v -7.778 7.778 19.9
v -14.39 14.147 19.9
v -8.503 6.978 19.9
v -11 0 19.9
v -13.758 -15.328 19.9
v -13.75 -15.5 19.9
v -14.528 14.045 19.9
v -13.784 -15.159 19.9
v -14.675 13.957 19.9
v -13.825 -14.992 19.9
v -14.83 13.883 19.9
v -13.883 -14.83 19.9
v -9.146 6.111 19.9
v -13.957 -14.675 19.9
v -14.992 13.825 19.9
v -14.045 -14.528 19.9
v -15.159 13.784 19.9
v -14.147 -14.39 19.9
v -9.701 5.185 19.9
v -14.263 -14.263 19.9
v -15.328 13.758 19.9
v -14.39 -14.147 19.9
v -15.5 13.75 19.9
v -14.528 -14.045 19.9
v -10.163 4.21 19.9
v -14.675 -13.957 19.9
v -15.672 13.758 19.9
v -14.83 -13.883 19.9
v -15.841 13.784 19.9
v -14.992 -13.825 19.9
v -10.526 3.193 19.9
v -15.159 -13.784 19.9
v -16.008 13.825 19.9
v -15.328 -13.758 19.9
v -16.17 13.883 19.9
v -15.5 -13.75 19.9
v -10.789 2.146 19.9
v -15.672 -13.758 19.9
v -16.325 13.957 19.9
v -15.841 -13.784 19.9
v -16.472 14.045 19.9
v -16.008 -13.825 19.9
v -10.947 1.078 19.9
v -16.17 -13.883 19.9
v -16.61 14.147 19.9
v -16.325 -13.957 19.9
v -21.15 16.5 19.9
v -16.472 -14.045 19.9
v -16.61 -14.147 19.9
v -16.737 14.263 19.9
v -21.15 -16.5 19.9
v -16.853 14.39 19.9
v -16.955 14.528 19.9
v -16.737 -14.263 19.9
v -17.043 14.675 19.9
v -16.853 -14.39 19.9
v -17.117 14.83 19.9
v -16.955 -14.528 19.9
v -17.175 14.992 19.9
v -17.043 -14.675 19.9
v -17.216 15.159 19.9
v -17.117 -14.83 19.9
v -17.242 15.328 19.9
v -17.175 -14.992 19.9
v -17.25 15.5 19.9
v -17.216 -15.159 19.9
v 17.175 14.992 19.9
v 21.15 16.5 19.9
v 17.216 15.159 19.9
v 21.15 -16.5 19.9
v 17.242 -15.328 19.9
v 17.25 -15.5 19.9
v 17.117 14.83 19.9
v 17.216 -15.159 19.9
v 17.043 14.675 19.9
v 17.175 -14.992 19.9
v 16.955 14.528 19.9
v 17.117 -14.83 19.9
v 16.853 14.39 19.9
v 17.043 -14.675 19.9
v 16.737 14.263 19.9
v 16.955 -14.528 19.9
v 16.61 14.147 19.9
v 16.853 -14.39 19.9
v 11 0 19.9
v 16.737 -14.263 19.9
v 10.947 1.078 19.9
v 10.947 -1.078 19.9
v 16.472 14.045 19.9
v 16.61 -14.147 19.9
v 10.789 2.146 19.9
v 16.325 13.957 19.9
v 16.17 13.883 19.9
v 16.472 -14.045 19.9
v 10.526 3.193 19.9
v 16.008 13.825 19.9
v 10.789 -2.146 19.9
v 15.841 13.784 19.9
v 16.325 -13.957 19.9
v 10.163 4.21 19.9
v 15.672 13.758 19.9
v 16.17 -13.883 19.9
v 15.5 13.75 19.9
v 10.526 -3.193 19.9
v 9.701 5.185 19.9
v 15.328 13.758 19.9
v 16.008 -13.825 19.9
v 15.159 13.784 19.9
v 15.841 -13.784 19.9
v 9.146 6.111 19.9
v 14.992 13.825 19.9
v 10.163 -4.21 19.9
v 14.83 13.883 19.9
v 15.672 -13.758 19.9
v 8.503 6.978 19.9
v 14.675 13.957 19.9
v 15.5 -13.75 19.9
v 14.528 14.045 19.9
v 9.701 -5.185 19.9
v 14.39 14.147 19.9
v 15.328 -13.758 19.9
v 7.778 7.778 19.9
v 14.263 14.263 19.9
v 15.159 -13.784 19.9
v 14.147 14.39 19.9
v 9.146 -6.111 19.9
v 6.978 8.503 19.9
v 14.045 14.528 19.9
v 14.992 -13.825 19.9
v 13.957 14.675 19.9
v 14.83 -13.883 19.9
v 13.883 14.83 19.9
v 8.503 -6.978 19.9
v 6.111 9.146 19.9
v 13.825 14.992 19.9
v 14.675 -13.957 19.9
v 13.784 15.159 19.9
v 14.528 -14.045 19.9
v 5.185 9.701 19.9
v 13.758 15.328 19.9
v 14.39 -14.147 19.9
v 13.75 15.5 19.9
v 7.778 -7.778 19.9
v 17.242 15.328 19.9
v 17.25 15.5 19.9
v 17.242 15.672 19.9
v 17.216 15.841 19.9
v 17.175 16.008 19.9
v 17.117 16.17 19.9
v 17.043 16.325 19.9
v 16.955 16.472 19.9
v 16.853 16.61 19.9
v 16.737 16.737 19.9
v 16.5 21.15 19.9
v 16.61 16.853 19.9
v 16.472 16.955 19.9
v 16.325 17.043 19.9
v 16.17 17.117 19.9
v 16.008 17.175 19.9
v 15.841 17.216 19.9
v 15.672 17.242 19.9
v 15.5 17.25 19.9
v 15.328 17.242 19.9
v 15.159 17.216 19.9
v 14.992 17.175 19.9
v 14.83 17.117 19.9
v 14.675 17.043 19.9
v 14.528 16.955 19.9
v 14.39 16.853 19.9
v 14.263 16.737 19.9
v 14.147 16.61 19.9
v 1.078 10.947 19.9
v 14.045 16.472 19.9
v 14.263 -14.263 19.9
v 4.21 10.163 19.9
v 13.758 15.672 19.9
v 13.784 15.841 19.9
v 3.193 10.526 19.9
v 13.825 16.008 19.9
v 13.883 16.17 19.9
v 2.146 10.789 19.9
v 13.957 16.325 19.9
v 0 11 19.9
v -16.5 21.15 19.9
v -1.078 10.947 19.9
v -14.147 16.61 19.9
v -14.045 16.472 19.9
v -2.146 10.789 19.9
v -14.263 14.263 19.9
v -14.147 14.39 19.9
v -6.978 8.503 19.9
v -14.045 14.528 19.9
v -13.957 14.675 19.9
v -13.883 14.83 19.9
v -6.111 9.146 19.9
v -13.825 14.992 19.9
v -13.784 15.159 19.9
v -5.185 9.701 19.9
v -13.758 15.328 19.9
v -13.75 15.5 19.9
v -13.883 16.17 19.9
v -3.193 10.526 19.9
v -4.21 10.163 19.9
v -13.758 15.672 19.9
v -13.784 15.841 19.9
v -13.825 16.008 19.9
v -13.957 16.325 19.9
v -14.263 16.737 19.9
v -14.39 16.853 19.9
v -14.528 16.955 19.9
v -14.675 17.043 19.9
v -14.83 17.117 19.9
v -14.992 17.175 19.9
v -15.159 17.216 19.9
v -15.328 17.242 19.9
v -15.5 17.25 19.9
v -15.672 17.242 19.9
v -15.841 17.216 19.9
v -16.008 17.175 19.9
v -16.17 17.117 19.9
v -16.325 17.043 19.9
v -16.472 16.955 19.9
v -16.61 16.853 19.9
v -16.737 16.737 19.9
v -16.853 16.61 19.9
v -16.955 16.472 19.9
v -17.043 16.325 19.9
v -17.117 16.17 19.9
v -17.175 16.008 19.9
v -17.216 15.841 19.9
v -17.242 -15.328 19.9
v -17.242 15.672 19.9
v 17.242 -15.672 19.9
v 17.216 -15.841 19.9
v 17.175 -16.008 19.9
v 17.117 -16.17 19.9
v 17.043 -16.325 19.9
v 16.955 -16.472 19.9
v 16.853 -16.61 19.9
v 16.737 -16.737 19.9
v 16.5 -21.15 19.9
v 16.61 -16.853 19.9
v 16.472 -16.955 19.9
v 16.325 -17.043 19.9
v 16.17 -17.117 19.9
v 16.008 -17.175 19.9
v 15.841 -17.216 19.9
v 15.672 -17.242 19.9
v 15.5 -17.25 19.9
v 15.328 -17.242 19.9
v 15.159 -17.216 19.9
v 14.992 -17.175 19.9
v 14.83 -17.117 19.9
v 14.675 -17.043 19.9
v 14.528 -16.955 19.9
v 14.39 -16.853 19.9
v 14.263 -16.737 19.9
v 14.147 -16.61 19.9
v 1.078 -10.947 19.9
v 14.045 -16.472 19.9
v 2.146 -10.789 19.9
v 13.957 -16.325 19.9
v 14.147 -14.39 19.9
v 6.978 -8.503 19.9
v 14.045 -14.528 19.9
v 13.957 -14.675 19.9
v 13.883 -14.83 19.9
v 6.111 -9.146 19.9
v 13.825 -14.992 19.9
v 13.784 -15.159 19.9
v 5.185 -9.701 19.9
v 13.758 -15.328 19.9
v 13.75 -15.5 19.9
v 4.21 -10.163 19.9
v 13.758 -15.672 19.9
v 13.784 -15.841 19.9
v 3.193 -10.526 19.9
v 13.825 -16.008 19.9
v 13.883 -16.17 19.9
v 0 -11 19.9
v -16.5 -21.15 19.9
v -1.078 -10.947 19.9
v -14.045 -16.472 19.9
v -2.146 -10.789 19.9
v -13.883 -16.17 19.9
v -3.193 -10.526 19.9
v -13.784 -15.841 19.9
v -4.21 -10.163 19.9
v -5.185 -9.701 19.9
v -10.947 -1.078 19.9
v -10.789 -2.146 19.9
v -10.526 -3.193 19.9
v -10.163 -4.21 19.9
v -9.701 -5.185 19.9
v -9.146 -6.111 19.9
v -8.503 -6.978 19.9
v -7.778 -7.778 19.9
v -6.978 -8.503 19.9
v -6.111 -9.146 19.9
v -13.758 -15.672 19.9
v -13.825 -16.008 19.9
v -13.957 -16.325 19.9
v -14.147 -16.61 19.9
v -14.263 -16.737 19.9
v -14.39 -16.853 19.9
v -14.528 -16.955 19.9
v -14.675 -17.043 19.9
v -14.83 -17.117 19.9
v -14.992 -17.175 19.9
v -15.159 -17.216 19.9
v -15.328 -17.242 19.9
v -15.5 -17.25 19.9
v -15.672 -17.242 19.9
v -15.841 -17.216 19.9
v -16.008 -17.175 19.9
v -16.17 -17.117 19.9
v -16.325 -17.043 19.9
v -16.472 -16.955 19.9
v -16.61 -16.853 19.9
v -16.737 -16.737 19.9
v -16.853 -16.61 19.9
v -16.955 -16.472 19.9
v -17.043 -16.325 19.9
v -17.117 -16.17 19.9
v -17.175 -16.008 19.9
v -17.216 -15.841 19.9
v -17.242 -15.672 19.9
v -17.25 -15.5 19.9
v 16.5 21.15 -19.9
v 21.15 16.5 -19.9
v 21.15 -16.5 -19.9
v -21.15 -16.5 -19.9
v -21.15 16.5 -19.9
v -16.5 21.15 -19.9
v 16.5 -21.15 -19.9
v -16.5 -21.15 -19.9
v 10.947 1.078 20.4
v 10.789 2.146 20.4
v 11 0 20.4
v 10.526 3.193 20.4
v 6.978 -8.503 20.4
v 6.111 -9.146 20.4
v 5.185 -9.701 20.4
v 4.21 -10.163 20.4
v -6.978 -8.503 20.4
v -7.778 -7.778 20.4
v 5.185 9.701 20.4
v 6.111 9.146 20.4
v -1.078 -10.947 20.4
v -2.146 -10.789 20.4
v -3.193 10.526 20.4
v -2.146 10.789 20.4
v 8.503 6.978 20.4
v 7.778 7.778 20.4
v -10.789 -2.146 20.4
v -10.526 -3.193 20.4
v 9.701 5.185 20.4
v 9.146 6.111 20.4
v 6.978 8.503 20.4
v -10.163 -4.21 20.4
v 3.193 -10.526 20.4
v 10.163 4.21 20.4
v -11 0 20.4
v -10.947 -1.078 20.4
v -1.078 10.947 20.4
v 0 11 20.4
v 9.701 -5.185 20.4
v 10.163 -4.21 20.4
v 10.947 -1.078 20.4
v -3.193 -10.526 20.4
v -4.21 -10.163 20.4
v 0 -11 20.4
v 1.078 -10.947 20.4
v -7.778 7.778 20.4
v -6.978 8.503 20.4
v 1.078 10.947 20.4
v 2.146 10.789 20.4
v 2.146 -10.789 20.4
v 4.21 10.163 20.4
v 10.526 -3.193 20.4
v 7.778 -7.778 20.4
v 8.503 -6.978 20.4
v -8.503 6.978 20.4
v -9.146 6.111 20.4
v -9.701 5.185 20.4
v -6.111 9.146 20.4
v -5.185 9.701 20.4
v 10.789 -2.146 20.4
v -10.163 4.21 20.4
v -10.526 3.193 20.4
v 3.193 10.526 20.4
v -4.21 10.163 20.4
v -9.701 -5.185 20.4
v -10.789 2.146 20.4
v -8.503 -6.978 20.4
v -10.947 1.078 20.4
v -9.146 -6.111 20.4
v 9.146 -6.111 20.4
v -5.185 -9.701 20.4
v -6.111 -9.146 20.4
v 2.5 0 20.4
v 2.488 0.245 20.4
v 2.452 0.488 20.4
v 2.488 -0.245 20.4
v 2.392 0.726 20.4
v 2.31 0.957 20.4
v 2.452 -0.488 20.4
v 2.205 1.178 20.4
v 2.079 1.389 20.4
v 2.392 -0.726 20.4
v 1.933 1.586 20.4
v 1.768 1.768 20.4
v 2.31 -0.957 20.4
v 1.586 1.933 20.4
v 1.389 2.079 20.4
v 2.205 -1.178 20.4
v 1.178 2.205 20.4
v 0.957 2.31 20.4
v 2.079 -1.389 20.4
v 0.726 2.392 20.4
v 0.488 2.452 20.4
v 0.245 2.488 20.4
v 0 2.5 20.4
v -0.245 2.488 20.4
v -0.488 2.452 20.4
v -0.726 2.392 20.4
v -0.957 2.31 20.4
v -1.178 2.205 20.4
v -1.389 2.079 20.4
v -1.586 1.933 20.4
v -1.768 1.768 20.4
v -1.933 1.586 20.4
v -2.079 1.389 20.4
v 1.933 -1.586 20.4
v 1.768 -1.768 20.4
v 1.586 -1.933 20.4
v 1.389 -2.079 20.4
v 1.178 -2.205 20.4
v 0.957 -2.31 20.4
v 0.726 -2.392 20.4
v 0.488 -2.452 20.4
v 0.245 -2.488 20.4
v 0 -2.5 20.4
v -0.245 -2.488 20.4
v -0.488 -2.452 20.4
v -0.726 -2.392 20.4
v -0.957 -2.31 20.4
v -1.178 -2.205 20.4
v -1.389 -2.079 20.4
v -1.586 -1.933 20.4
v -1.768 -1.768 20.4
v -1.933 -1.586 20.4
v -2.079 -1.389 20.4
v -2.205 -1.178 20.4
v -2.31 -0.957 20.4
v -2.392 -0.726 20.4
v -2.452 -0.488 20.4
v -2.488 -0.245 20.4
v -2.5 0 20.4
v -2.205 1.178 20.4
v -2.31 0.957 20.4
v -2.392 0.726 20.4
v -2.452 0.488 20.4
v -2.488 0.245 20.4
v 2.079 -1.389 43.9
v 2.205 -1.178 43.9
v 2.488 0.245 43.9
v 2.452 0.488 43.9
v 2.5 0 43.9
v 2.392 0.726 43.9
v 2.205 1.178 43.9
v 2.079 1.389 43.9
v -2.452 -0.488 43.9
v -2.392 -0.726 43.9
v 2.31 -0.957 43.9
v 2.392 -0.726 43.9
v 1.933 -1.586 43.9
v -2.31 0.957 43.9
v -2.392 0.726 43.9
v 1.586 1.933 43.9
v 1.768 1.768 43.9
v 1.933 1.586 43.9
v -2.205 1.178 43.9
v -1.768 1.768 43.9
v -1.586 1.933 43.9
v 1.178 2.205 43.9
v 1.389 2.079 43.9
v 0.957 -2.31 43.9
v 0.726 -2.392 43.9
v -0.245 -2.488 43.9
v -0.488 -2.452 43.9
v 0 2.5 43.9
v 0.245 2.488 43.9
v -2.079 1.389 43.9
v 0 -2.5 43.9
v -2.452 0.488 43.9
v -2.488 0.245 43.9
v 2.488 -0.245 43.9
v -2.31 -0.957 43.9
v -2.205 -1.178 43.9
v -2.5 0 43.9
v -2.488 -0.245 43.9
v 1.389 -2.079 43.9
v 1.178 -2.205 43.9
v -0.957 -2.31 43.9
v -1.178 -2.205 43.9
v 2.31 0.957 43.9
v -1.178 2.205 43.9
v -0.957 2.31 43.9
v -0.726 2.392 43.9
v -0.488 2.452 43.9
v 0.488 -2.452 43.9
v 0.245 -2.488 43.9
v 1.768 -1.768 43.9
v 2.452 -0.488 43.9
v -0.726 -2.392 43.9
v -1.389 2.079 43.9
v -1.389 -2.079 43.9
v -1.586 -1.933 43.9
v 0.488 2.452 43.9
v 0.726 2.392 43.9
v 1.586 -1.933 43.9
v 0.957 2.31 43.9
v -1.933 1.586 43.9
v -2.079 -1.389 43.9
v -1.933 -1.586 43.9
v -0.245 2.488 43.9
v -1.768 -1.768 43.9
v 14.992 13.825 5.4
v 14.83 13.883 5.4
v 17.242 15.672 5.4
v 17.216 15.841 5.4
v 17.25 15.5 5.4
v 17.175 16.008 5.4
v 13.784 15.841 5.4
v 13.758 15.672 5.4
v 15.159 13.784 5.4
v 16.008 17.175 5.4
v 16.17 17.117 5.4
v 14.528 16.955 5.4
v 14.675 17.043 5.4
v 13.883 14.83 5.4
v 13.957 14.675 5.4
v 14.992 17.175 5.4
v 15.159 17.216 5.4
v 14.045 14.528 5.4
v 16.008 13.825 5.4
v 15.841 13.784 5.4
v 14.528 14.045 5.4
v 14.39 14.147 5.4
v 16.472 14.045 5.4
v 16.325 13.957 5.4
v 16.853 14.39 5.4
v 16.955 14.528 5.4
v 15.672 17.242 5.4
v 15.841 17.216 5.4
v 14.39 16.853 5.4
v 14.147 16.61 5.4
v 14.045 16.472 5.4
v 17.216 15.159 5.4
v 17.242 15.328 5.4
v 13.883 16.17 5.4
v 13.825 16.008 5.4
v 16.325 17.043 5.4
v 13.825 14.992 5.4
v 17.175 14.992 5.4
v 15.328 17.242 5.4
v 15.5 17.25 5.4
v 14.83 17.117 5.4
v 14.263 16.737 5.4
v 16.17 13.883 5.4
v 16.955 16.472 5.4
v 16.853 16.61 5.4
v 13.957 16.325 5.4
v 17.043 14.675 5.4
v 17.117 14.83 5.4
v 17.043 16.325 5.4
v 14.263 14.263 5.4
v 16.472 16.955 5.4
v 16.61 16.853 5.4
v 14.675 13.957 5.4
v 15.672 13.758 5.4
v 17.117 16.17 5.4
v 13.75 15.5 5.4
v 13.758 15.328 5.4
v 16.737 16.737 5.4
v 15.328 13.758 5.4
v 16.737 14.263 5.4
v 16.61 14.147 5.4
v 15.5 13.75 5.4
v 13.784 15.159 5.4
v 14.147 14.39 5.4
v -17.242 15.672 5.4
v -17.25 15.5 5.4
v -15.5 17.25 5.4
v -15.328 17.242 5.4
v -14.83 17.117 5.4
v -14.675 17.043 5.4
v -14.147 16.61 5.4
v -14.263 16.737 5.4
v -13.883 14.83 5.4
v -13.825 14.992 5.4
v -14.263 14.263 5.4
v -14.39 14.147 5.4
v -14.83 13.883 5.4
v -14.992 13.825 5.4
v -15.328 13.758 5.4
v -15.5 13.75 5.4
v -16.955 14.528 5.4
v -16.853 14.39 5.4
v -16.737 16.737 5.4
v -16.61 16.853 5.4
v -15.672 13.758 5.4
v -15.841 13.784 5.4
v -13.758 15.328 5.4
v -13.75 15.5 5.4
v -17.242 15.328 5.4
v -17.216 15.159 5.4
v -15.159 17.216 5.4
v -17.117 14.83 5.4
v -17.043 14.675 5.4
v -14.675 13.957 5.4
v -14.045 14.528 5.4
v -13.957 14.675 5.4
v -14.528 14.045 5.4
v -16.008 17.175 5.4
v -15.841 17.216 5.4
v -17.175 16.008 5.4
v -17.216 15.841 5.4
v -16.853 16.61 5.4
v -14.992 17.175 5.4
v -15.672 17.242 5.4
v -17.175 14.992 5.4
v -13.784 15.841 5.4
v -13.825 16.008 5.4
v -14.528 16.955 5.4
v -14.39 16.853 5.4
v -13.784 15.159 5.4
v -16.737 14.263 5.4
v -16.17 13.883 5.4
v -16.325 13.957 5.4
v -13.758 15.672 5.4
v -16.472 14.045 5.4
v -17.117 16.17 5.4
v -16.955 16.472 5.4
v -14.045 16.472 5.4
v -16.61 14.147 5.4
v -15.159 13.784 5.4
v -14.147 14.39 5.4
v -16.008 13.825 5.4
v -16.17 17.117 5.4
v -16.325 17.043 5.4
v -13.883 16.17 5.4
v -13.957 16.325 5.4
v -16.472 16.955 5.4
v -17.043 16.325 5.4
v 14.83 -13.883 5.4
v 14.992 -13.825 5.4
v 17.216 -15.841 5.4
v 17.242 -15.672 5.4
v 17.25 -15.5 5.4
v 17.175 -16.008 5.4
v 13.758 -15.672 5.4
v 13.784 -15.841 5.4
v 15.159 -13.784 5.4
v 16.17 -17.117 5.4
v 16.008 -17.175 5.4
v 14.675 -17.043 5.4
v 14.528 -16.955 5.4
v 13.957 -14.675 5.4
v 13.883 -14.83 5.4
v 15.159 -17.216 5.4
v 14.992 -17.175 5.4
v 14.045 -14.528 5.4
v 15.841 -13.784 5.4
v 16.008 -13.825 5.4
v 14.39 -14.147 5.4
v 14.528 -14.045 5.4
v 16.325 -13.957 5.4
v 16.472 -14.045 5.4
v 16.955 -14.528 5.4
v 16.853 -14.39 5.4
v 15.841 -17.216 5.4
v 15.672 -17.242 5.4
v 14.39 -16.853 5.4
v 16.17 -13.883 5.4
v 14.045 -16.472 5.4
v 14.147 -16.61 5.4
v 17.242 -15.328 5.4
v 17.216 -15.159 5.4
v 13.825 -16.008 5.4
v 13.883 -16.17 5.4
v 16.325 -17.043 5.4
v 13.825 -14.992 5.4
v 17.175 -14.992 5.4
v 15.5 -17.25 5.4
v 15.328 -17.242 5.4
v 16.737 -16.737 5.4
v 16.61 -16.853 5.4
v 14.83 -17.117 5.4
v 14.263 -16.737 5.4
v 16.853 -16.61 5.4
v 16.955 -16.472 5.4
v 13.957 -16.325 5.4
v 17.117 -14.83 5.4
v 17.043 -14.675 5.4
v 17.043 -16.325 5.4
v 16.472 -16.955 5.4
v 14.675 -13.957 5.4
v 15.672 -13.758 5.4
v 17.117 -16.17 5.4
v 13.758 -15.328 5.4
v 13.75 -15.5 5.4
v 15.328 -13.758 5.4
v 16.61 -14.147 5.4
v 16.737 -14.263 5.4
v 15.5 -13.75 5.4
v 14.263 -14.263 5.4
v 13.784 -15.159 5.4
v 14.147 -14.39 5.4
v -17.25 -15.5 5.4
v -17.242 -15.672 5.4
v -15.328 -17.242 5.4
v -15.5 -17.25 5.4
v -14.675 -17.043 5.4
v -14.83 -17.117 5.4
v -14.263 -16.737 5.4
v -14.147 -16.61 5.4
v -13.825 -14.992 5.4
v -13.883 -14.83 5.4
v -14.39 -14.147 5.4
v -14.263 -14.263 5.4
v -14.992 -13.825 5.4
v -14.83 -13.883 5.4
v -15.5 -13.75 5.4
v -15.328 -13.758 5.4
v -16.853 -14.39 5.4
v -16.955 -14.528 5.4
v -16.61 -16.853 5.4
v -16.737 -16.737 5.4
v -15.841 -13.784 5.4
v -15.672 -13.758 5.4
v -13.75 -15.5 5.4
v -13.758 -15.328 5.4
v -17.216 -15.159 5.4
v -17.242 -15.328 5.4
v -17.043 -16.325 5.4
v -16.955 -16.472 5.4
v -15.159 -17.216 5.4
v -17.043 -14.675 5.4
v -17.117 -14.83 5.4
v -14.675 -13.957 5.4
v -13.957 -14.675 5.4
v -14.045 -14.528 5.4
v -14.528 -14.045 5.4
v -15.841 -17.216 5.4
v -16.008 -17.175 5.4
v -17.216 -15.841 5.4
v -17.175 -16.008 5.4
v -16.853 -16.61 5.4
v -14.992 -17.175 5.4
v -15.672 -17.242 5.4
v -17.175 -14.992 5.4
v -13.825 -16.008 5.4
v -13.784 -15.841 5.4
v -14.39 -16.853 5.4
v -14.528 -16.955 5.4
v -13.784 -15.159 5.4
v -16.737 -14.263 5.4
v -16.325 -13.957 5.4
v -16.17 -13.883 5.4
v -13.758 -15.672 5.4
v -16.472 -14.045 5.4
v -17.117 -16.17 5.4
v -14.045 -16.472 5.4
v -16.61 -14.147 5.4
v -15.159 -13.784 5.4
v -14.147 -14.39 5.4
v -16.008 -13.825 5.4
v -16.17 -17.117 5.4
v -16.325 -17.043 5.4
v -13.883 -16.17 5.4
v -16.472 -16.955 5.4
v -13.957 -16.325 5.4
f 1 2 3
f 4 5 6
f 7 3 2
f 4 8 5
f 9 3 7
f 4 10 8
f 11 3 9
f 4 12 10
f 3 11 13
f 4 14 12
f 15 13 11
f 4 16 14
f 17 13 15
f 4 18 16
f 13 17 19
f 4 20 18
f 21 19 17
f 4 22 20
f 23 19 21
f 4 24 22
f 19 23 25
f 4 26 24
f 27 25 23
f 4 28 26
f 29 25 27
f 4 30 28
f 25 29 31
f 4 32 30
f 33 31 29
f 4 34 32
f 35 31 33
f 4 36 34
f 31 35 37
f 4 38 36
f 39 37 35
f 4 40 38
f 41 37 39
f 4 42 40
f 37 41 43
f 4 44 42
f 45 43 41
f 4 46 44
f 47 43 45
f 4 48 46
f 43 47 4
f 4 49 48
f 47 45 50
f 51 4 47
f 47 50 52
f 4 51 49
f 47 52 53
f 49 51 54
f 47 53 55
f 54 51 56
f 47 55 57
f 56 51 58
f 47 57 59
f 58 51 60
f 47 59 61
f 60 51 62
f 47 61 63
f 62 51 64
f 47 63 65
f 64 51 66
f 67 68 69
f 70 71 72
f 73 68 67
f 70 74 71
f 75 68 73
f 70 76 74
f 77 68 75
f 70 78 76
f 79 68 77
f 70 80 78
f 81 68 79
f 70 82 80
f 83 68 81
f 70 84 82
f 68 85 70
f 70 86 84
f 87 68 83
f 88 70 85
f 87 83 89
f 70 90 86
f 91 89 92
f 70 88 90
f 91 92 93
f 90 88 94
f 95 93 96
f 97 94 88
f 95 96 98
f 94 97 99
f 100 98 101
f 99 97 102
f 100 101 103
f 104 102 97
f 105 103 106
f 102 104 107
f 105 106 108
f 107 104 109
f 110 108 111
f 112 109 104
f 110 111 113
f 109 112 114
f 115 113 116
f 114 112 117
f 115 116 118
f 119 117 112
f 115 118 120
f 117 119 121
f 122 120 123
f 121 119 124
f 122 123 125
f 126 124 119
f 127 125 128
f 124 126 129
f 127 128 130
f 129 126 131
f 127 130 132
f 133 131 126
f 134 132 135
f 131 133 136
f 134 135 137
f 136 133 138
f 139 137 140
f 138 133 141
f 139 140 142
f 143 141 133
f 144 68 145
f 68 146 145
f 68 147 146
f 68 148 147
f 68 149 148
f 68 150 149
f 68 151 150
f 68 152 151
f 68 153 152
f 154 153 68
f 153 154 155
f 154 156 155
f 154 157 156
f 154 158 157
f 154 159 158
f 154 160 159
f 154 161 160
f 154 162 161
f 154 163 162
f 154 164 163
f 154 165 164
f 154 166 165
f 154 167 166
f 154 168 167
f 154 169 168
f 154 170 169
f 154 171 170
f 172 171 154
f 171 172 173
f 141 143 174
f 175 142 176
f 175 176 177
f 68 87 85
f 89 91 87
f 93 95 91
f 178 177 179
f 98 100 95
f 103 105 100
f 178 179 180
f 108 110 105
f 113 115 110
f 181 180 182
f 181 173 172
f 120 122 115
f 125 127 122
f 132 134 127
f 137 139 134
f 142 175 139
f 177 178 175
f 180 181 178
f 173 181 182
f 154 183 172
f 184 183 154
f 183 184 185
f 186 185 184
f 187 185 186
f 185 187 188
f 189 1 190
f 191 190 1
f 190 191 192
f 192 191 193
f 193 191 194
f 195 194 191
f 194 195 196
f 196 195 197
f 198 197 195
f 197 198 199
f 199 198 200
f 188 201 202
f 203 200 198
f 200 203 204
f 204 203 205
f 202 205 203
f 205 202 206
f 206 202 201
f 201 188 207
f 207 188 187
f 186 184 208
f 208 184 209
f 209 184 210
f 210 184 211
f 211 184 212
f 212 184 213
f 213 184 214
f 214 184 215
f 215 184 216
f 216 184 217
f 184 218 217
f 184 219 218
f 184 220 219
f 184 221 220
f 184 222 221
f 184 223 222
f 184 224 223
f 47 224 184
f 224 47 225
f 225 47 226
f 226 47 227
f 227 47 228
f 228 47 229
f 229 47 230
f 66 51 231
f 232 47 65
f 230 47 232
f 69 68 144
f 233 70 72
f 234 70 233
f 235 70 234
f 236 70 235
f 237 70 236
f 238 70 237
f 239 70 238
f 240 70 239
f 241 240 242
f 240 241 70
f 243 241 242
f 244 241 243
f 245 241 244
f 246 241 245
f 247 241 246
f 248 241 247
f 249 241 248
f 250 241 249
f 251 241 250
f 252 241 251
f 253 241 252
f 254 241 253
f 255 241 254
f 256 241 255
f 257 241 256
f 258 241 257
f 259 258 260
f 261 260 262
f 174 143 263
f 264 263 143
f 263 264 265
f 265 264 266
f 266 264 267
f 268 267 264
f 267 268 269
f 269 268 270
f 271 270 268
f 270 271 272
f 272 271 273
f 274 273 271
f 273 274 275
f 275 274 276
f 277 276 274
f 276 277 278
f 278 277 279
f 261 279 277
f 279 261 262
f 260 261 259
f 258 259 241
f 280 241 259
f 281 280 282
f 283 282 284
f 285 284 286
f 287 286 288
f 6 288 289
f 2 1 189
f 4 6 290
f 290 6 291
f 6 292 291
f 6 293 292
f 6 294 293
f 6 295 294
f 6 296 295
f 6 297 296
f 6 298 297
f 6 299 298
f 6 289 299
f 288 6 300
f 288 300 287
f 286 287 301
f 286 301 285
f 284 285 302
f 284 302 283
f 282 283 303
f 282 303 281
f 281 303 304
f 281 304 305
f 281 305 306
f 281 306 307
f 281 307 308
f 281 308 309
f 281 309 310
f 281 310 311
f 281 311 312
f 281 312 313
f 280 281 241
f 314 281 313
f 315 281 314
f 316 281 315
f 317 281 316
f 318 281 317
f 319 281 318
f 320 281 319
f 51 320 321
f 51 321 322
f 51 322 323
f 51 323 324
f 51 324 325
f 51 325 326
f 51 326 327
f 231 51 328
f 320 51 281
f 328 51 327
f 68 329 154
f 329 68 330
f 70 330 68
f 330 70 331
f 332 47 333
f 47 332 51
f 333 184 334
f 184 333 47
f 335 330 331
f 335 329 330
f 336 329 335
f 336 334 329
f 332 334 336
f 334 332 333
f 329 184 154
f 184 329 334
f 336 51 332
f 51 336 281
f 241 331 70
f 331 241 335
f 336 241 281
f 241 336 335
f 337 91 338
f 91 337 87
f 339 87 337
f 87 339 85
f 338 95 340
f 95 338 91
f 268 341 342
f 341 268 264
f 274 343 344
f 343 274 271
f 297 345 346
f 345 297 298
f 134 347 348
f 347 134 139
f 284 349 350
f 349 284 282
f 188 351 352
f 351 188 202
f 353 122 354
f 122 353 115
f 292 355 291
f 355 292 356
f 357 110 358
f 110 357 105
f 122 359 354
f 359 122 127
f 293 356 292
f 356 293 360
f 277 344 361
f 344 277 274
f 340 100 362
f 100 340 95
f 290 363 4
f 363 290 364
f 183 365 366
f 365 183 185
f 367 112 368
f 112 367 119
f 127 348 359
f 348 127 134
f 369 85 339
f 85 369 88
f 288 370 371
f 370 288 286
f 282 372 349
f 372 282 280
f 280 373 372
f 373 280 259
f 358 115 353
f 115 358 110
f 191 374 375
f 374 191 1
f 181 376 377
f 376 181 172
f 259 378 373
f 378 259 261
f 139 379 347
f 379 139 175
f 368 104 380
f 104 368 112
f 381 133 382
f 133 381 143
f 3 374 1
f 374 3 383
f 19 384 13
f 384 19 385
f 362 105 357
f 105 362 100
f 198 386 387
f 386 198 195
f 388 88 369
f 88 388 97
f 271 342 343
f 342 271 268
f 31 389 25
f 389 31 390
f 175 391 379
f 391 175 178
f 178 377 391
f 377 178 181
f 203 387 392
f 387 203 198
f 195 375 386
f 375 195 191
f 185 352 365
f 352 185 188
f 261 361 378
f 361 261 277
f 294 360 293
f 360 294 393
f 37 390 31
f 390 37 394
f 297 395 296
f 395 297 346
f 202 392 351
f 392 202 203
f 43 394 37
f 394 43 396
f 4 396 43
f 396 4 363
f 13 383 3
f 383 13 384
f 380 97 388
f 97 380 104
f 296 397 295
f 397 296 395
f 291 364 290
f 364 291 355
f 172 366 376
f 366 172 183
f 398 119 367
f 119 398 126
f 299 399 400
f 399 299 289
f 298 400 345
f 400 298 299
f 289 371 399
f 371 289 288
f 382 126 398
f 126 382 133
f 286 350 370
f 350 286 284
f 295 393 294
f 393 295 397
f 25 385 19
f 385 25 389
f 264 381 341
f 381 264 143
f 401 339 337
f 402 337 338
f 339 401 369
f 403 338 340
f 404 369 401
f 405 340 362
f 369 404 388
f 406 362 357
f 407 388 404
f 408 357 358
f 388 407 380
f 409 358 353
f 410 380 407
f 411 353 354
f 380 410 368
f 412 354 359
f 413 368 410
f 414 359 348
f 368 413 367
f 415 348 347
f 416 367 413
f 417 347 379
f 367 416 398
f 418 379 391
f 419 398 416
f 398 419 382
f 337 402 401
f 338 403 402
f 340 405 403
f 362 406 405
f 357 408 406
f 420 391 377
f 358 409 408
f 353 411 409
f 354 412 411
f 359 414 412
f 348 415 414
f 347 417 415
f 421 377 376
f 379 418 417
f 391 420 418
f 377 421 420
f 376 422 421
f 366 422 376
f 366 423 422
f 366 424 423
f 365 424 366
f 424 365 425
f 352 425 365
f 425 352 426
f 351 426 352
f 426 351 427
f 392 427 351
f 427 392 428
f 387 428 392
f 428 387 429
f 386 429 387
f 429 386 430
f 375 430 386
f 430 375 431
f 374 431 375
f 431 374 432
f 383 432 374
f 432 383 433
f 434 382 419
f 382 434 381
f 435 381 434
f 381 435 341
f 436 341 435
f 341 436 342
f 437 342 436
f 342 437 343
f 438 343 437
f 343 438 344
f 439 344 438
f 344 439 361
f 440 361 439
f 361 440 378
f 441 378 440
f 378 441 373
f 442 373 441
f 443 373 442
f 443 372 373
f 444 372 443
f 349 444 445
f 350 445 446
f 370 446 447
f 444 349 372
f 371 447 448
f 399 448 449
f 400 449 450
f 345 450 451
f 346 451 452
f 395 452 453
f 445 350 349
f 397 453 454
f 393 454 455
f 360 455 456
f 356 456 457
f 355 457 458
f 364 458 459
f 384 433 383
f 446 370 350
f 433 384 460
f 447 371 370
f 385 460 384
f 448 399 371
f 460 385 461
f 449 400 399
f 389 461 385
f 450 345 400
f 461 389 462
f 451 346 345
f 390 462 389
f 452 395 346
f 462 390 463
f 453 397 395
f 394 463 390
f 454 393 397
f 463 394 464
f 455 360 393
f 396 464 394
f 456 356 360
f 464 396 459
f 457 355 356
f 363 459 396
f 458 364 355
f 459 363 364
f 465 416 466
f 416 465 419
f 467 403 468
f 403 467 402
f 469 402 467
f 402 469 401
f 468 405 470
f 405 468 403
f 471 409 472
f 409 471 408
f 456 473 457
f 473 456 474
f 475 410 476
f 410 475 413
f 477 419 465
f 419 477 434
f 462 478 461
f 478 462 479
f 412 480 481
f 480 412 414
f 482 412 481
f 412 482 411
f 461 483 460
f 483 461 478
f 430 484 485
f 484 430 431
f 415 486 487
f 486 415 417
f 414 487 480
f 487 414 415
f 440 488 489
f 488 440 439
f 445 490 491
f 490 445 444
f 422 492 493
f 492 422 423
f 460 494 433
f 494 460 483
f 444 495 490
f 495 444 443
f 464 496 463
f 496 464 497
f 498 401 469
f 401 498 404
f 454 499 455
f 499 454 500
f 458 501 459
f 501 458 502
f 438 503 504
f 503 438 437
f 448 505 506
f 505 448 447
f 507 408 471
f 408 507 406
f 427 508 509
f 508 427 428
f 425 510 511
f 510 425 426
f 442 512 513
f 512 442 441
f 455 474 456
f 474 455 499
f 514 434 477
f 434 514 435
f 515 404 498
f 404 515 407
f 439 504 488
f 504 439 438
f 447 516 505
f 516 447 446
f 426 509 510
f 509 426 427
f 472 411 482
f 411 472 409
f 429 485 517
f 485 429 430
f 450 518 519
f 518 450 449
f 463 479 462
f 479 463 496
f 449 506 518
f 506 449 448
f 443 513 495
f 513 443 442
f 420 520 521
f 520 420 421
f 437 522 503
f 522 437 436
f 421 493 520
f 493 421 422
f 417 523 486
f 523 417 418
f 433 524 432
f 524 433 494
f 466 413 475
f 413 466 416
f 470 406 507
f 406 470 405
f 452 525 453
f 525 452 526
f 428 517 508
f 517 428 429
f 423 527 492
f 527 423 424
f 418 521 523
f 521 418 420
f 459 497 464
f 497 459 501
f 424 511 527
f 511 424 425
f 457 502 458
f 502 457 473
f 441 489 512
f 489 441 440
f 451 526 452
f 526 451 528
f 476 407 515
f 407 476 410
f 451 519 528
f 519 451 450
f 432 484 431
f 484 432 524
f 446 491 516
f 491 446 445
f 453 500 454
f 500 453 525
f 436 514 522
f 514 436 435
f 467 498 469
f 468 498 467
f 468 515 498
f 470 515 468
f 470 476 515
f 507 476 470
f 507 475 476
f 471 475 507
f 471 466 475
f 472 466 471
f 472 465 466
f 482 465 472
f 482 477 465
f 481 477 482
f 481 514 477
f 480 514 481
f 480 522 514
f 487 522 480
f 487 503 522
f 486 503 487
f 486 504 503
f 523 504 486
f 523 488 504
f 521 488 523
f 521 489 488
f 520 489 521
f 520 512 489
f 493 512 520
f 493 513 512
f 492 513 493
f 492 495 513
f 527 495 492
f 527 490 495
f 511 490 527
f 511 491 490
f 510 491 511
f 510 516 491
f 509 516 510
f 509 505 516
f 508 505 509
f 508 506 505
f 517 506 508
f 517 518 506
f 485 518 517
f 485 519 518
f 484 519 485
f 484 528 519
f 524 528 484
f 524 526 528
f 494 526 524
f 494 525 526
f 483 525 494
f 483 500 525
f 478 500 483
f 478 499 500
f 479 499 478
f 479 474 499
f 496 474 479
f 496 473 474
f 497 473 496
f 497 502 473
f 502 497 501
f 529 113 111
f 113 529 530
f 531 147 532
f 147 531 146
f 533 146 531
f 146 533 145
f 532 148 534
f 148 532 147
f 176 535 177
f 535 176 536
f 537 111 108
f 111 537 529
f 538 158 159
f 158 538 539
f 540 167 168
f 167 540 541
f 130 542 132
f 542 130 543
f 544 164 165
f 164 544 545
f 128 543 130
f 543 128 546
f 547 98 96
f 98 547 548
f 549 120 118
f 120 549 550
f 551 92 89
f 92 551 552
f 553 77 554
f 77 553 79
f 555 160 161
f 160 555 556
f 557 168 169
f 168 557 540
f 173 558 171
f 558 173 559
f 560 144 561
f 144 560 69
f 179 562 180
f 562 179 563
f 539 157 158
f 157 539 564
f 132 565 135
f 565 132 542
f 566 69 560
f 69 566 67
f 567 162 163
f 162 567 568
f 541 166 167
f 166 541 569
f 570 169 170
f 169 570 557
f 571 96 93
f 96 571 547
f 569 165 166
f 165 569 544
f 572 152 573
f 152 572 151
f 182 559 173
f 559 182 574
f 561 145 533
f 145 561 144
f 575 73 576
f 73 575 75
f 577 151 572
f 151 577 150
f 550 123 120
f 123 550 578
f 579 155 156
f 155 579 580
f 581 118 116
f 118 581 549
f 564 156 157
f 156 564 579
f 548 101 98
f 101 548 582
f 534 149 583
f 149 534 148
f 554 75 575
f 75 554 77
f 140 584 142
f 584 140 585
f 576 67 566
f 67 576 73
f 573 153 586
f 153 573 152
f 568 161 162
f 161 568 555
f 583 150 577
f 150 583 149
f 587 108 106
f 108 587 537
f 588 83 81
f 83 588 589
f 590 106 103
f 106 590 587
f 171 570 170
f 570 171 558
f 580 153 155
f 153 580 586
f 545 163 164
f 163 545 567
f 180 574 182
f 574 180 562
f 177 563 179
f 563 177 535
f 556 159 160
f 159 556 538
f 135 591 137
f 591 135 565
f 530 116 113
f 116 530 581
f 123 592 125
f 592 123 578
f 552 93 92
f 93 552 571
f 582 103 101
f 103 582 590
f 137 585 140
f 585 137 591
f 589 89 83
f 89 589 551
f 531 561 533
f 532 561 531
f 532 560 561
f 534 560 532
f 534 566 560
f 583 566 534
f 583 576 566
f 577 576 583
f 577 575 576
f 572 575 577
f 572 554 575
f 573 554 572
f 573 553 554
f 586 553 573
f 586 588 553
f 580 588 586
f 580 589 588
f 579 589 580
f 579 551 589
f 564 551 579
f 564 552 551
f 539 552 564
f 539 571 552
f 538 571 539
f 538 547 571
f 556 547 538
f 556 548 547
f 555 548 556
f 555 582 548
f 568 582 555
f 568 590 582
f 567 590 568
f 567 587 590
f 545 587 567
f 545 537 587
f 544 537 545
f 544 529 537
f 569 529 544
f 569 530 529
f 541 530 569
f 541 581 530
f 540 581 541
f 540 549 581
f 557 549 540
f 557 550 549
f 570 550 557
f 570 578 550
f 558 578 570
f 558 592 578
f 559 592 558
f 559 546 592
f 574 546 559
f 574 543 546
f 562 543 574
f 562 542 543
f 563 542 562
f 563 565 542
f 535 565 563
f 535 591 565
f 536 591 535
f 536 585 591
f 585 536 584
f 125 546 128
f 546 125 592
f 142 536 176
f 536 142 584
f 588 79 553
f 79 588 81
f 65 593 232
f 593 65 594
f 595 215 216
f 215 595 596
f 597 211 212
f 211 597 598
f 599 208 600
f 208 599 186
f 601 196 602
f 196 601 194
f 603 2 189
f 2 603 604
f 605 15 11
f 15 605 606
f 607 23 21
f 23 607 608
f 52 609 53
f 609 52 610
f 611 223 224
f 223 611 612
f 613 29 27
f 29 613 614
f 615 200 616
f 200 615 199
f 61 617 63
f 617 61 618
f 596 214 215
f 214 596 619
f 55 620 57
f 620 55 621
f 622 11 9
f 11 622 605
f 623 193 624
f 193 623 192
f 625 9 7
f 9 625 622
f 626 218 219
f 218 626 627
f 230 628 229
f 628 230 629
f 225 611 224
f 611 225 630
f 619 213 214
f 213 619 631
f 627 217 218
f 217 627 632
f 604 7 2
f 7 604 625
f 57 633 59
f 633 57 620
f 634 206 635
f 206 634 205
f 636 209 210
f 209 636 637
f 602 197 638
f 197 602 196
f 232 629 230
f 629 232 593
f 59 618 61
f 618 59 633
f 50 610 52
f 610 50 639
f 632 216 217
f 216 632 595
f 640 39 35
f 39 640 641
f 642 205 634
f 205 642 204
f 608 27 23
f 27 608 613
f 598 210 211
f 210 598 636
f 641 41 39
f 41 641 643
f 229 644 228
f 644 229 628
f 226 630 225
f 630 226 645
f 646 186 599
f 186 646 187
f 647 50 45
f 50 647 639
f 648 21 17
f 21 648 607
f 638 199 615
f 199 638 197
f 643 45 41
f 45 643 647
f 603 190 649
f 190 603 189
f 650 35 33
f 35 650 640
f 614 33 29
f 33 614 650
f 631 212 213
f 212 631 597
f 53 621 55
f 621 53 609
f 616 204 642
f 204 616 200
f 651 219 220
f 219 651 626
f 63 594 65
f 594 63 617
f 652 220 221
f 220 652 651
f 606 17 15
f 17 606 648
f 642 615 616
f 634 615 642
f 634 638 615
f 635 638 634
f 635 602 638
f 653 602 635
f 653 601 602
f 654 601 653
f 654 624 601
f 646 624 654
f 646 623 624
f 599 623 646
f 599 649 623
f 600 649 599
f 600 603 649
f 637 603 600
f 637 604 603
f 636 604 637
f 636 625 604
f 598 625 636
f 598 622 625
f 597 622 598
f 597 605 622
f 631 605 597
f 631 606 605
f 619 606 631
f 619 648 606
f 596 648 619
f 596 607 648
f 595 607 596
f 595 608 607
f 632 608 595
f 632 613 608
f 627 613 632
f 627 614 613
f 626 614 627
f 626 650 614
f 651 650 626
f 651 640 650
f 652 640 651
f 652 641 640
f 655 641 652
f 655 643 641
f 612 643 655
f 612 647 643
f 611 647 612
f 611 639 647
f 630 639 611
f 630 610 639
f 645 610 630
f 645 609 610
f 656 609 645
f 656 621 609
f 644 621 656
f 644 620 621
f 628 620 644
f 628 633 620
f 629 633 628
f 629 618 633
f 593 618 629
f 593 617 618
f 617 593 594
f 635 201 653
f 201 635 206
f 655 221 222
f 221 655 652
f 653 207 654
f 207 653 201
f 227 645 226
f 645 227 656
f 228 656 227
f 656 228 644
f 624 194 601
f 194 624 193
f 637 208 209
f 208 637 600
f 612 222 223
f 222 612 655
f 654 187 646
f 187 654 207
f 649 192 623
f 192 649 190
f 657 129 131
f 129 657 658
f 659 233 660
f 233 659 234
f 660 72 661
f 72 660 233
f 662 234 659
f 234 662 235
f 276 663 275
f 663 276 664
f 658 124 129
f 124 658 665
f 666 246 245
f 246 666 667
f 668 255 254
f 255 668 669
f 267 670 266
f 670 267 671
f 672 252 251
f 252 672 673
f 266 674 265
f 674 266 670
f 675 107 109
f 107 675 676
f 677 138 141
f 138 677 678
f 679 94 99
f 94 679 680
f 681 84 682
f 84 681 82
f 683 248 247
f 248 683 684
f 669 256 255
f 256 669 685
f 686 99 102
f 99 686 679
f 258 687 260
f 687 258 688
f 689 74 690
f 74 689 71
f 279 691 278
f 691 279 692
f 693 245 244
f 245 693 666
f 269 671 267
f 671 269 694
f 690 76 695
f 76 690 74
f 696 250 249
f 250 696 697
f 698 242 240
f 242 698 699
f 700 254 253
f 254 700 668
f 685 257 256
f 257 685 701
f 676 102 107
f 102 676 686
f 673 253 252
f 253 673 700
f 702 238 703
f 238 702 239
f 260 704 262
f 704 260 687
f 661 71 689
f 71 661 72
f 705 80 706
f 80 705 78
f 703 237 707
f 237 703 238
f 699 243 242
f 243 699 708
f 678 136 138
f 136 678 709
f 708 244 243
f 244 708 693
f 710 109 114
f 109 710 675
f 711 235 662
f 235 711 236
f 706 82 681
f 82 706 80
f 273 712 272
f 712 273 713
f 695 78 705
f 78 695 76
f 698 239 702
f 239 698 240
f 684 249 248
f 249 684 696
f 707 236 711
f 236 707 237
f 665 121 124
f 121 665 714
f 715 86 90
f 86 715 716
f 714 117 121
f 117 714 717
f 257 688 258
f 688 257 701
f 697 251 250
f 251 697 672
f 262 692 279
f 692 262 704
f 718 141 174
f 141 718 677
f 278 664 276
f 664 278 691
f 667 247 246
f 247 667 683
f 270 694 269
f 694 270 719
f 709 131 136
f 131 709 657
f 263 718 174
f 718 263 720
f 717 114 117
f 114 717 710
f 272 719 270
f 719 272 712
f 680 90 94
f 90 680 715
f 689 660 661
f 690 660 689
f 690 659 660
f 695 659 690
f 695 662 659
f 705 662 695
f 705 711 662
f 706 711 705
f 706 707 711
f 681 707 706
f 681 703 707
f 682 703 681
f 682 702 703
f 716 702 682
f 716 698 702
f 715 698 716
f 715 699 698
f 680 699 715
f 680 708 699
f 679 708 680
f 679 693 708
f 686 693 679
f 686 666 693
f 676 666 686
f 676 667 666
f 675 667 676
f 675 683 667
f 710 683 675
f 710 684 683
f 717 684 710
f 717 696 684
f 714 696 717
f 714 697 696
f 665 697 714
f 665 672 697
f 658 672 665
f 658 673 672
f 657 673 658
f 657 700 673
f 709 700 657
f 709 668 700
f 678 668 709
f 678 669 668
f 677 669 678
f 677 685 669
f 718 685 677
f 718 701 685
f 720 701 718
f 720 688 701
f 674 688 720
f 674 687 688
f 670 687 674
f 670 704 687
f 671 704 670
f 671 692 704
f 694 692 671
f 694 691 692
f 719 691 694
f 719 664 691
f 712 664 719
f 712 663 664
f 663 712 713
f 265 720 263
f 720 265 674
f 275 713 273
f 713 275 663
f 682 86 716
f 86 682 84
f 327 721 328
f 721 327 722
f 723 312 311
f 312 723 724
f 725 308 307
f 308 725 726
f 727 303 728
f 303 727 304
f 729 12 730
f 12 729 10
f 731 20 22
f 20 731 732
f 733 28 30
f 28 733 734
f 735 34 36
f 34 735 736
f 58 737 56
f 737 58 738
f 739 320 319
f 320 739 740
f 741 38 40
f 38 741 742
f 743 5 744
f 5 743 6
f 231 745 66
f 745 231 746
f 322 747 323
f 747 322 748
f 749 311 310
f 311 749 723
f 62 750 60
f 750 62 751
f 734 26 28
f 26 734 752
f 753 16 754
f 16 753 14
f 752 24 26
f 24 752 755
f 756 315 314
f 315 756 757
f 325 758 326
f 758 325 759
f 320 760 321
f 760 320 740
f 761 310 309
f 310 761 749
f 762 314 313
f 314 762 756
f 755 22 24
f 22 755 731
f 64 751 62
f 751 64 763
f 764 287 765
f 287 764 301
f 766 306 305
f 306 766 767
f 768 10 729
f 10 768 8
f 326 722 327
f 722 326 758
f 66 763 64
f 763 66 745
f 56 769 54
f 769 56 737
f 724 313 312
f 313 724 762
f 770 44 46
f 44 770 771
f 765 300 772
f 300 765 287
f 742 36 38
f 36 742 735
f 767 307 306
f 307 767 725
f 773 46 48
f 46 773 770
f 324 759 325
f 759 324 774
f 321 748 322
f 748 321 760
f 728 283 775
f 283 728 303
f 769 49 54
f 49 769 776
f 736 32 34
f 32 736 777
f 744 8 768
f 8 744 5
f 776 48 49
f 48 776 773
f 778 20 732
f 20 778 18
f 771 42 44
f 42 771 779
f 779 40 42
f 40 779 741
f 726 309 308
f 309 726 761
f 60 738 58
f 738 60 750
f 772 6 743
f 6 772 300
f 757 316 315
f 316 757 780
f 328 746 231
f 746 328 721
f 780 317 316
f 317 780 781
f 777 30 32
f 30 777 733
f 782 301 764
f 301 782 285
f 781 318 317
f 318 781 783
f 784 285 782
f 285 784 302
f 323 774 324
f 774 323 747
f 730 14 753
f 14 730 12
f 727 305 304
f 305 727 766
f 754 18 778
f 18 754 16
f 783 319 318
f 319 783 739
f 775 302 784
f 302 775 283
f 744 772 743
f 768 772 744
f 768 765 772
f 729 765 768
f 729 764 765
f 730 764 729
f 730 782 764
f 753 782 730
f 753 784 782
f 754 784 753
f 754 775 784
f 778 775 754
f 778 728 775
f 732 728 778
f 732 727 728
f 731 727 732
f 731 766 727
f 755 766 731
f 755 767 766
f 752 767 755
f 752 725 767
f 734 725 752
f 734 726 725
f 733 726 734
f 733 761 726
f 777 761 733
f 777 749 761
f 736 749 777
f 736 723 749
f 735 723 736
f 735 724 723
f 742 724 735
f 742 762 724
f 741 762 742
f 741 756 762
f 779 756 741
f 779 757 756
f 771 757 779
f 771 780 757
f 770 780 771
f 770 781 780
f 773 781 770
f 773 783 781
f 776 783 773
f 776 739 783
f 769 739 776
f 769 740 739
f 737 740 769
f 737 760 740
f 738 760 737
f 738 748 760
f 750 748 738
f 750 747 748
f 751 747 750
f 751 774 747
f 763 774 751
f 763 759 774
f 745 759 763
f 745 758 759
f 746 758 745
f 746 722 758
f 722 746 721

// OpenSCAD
///VARIABLES

//Overall width.
cube_x = 42.3; //[10:0.1:100]
//Width to the chamfer - if none, just keep it the same as the x value.
cube_y = 33; //[10:0.1:100]
//Depth OR Length of the motor
cube_z = 39.8; //[10:0.1:100]

//The large slightly protruding inner cylinder that surrounds the shaft
cyl_dia = 22; //[10:0.1:100]
//Amount by which the inner cylinder protrudes above the flat top of the motor
cyl_extra_height = 2;

//Shaft diameter
shaft_dia = 5;
//Shaft length above the top of the main flat of the motor -- NOT the protruding cylinder
shaft_length = 24;

//The diameter of the threaded inserts
retain_dia = 3.5;
//Overall seperation of the centers of the threaded retaining holes 
retain_placement = 31; 
//How deep the holes extend into the body, set to zero to remove
retain_depth = 15;


//Variables - Inner
retain_spacing = retain_placement/2;
cyl_resolution = 64*1;






///RENDERS
difference(){
union(){
hull(){
wide_cube();
tall_cube();
}

large_cylinder();
shaft();
}

retain_all();
}

///MODULES
module retain_all(){
    translate([0,0,(cube_z/2) - (retain_depth/2) + 1]){   
    retain_double();
    mirror([0,1,0]){
           retain_double();
        }
    }
}

module retain_double(){
    retain_single();
    mirror([1,0,0]){
        retain_single();
    }
}

module retain_single(){
    translate([retain_spacing,retain_spacing,0]){
        cylinder(h = retain_depth + 1, d = retain_dia, center = true, $fn = cyl_resolution); 
    }
}


module wide_cube(){
    
    cube([cube_x,cube_y,cube_z], center = true);
    
}

module tall_cube(){
       
    rotate([0,0,90]){
        wide_cube();
    }
    
}

module large_cylinder(){
    translate([0,0,(cube_z/2) - 1]){
        cylinder(h = cyl_extra_height + 1, d = cyl_dia, center = true, $fn = cyl_resolution); 
    }
}

module shaft(){
    translate([0,0,(cube_z/2) + (shaft_length/2)]){
        cylinder(h = shaft_length, d = shaft_dia, center = true, $fn = cyl_resolution); 
    }
    
}
